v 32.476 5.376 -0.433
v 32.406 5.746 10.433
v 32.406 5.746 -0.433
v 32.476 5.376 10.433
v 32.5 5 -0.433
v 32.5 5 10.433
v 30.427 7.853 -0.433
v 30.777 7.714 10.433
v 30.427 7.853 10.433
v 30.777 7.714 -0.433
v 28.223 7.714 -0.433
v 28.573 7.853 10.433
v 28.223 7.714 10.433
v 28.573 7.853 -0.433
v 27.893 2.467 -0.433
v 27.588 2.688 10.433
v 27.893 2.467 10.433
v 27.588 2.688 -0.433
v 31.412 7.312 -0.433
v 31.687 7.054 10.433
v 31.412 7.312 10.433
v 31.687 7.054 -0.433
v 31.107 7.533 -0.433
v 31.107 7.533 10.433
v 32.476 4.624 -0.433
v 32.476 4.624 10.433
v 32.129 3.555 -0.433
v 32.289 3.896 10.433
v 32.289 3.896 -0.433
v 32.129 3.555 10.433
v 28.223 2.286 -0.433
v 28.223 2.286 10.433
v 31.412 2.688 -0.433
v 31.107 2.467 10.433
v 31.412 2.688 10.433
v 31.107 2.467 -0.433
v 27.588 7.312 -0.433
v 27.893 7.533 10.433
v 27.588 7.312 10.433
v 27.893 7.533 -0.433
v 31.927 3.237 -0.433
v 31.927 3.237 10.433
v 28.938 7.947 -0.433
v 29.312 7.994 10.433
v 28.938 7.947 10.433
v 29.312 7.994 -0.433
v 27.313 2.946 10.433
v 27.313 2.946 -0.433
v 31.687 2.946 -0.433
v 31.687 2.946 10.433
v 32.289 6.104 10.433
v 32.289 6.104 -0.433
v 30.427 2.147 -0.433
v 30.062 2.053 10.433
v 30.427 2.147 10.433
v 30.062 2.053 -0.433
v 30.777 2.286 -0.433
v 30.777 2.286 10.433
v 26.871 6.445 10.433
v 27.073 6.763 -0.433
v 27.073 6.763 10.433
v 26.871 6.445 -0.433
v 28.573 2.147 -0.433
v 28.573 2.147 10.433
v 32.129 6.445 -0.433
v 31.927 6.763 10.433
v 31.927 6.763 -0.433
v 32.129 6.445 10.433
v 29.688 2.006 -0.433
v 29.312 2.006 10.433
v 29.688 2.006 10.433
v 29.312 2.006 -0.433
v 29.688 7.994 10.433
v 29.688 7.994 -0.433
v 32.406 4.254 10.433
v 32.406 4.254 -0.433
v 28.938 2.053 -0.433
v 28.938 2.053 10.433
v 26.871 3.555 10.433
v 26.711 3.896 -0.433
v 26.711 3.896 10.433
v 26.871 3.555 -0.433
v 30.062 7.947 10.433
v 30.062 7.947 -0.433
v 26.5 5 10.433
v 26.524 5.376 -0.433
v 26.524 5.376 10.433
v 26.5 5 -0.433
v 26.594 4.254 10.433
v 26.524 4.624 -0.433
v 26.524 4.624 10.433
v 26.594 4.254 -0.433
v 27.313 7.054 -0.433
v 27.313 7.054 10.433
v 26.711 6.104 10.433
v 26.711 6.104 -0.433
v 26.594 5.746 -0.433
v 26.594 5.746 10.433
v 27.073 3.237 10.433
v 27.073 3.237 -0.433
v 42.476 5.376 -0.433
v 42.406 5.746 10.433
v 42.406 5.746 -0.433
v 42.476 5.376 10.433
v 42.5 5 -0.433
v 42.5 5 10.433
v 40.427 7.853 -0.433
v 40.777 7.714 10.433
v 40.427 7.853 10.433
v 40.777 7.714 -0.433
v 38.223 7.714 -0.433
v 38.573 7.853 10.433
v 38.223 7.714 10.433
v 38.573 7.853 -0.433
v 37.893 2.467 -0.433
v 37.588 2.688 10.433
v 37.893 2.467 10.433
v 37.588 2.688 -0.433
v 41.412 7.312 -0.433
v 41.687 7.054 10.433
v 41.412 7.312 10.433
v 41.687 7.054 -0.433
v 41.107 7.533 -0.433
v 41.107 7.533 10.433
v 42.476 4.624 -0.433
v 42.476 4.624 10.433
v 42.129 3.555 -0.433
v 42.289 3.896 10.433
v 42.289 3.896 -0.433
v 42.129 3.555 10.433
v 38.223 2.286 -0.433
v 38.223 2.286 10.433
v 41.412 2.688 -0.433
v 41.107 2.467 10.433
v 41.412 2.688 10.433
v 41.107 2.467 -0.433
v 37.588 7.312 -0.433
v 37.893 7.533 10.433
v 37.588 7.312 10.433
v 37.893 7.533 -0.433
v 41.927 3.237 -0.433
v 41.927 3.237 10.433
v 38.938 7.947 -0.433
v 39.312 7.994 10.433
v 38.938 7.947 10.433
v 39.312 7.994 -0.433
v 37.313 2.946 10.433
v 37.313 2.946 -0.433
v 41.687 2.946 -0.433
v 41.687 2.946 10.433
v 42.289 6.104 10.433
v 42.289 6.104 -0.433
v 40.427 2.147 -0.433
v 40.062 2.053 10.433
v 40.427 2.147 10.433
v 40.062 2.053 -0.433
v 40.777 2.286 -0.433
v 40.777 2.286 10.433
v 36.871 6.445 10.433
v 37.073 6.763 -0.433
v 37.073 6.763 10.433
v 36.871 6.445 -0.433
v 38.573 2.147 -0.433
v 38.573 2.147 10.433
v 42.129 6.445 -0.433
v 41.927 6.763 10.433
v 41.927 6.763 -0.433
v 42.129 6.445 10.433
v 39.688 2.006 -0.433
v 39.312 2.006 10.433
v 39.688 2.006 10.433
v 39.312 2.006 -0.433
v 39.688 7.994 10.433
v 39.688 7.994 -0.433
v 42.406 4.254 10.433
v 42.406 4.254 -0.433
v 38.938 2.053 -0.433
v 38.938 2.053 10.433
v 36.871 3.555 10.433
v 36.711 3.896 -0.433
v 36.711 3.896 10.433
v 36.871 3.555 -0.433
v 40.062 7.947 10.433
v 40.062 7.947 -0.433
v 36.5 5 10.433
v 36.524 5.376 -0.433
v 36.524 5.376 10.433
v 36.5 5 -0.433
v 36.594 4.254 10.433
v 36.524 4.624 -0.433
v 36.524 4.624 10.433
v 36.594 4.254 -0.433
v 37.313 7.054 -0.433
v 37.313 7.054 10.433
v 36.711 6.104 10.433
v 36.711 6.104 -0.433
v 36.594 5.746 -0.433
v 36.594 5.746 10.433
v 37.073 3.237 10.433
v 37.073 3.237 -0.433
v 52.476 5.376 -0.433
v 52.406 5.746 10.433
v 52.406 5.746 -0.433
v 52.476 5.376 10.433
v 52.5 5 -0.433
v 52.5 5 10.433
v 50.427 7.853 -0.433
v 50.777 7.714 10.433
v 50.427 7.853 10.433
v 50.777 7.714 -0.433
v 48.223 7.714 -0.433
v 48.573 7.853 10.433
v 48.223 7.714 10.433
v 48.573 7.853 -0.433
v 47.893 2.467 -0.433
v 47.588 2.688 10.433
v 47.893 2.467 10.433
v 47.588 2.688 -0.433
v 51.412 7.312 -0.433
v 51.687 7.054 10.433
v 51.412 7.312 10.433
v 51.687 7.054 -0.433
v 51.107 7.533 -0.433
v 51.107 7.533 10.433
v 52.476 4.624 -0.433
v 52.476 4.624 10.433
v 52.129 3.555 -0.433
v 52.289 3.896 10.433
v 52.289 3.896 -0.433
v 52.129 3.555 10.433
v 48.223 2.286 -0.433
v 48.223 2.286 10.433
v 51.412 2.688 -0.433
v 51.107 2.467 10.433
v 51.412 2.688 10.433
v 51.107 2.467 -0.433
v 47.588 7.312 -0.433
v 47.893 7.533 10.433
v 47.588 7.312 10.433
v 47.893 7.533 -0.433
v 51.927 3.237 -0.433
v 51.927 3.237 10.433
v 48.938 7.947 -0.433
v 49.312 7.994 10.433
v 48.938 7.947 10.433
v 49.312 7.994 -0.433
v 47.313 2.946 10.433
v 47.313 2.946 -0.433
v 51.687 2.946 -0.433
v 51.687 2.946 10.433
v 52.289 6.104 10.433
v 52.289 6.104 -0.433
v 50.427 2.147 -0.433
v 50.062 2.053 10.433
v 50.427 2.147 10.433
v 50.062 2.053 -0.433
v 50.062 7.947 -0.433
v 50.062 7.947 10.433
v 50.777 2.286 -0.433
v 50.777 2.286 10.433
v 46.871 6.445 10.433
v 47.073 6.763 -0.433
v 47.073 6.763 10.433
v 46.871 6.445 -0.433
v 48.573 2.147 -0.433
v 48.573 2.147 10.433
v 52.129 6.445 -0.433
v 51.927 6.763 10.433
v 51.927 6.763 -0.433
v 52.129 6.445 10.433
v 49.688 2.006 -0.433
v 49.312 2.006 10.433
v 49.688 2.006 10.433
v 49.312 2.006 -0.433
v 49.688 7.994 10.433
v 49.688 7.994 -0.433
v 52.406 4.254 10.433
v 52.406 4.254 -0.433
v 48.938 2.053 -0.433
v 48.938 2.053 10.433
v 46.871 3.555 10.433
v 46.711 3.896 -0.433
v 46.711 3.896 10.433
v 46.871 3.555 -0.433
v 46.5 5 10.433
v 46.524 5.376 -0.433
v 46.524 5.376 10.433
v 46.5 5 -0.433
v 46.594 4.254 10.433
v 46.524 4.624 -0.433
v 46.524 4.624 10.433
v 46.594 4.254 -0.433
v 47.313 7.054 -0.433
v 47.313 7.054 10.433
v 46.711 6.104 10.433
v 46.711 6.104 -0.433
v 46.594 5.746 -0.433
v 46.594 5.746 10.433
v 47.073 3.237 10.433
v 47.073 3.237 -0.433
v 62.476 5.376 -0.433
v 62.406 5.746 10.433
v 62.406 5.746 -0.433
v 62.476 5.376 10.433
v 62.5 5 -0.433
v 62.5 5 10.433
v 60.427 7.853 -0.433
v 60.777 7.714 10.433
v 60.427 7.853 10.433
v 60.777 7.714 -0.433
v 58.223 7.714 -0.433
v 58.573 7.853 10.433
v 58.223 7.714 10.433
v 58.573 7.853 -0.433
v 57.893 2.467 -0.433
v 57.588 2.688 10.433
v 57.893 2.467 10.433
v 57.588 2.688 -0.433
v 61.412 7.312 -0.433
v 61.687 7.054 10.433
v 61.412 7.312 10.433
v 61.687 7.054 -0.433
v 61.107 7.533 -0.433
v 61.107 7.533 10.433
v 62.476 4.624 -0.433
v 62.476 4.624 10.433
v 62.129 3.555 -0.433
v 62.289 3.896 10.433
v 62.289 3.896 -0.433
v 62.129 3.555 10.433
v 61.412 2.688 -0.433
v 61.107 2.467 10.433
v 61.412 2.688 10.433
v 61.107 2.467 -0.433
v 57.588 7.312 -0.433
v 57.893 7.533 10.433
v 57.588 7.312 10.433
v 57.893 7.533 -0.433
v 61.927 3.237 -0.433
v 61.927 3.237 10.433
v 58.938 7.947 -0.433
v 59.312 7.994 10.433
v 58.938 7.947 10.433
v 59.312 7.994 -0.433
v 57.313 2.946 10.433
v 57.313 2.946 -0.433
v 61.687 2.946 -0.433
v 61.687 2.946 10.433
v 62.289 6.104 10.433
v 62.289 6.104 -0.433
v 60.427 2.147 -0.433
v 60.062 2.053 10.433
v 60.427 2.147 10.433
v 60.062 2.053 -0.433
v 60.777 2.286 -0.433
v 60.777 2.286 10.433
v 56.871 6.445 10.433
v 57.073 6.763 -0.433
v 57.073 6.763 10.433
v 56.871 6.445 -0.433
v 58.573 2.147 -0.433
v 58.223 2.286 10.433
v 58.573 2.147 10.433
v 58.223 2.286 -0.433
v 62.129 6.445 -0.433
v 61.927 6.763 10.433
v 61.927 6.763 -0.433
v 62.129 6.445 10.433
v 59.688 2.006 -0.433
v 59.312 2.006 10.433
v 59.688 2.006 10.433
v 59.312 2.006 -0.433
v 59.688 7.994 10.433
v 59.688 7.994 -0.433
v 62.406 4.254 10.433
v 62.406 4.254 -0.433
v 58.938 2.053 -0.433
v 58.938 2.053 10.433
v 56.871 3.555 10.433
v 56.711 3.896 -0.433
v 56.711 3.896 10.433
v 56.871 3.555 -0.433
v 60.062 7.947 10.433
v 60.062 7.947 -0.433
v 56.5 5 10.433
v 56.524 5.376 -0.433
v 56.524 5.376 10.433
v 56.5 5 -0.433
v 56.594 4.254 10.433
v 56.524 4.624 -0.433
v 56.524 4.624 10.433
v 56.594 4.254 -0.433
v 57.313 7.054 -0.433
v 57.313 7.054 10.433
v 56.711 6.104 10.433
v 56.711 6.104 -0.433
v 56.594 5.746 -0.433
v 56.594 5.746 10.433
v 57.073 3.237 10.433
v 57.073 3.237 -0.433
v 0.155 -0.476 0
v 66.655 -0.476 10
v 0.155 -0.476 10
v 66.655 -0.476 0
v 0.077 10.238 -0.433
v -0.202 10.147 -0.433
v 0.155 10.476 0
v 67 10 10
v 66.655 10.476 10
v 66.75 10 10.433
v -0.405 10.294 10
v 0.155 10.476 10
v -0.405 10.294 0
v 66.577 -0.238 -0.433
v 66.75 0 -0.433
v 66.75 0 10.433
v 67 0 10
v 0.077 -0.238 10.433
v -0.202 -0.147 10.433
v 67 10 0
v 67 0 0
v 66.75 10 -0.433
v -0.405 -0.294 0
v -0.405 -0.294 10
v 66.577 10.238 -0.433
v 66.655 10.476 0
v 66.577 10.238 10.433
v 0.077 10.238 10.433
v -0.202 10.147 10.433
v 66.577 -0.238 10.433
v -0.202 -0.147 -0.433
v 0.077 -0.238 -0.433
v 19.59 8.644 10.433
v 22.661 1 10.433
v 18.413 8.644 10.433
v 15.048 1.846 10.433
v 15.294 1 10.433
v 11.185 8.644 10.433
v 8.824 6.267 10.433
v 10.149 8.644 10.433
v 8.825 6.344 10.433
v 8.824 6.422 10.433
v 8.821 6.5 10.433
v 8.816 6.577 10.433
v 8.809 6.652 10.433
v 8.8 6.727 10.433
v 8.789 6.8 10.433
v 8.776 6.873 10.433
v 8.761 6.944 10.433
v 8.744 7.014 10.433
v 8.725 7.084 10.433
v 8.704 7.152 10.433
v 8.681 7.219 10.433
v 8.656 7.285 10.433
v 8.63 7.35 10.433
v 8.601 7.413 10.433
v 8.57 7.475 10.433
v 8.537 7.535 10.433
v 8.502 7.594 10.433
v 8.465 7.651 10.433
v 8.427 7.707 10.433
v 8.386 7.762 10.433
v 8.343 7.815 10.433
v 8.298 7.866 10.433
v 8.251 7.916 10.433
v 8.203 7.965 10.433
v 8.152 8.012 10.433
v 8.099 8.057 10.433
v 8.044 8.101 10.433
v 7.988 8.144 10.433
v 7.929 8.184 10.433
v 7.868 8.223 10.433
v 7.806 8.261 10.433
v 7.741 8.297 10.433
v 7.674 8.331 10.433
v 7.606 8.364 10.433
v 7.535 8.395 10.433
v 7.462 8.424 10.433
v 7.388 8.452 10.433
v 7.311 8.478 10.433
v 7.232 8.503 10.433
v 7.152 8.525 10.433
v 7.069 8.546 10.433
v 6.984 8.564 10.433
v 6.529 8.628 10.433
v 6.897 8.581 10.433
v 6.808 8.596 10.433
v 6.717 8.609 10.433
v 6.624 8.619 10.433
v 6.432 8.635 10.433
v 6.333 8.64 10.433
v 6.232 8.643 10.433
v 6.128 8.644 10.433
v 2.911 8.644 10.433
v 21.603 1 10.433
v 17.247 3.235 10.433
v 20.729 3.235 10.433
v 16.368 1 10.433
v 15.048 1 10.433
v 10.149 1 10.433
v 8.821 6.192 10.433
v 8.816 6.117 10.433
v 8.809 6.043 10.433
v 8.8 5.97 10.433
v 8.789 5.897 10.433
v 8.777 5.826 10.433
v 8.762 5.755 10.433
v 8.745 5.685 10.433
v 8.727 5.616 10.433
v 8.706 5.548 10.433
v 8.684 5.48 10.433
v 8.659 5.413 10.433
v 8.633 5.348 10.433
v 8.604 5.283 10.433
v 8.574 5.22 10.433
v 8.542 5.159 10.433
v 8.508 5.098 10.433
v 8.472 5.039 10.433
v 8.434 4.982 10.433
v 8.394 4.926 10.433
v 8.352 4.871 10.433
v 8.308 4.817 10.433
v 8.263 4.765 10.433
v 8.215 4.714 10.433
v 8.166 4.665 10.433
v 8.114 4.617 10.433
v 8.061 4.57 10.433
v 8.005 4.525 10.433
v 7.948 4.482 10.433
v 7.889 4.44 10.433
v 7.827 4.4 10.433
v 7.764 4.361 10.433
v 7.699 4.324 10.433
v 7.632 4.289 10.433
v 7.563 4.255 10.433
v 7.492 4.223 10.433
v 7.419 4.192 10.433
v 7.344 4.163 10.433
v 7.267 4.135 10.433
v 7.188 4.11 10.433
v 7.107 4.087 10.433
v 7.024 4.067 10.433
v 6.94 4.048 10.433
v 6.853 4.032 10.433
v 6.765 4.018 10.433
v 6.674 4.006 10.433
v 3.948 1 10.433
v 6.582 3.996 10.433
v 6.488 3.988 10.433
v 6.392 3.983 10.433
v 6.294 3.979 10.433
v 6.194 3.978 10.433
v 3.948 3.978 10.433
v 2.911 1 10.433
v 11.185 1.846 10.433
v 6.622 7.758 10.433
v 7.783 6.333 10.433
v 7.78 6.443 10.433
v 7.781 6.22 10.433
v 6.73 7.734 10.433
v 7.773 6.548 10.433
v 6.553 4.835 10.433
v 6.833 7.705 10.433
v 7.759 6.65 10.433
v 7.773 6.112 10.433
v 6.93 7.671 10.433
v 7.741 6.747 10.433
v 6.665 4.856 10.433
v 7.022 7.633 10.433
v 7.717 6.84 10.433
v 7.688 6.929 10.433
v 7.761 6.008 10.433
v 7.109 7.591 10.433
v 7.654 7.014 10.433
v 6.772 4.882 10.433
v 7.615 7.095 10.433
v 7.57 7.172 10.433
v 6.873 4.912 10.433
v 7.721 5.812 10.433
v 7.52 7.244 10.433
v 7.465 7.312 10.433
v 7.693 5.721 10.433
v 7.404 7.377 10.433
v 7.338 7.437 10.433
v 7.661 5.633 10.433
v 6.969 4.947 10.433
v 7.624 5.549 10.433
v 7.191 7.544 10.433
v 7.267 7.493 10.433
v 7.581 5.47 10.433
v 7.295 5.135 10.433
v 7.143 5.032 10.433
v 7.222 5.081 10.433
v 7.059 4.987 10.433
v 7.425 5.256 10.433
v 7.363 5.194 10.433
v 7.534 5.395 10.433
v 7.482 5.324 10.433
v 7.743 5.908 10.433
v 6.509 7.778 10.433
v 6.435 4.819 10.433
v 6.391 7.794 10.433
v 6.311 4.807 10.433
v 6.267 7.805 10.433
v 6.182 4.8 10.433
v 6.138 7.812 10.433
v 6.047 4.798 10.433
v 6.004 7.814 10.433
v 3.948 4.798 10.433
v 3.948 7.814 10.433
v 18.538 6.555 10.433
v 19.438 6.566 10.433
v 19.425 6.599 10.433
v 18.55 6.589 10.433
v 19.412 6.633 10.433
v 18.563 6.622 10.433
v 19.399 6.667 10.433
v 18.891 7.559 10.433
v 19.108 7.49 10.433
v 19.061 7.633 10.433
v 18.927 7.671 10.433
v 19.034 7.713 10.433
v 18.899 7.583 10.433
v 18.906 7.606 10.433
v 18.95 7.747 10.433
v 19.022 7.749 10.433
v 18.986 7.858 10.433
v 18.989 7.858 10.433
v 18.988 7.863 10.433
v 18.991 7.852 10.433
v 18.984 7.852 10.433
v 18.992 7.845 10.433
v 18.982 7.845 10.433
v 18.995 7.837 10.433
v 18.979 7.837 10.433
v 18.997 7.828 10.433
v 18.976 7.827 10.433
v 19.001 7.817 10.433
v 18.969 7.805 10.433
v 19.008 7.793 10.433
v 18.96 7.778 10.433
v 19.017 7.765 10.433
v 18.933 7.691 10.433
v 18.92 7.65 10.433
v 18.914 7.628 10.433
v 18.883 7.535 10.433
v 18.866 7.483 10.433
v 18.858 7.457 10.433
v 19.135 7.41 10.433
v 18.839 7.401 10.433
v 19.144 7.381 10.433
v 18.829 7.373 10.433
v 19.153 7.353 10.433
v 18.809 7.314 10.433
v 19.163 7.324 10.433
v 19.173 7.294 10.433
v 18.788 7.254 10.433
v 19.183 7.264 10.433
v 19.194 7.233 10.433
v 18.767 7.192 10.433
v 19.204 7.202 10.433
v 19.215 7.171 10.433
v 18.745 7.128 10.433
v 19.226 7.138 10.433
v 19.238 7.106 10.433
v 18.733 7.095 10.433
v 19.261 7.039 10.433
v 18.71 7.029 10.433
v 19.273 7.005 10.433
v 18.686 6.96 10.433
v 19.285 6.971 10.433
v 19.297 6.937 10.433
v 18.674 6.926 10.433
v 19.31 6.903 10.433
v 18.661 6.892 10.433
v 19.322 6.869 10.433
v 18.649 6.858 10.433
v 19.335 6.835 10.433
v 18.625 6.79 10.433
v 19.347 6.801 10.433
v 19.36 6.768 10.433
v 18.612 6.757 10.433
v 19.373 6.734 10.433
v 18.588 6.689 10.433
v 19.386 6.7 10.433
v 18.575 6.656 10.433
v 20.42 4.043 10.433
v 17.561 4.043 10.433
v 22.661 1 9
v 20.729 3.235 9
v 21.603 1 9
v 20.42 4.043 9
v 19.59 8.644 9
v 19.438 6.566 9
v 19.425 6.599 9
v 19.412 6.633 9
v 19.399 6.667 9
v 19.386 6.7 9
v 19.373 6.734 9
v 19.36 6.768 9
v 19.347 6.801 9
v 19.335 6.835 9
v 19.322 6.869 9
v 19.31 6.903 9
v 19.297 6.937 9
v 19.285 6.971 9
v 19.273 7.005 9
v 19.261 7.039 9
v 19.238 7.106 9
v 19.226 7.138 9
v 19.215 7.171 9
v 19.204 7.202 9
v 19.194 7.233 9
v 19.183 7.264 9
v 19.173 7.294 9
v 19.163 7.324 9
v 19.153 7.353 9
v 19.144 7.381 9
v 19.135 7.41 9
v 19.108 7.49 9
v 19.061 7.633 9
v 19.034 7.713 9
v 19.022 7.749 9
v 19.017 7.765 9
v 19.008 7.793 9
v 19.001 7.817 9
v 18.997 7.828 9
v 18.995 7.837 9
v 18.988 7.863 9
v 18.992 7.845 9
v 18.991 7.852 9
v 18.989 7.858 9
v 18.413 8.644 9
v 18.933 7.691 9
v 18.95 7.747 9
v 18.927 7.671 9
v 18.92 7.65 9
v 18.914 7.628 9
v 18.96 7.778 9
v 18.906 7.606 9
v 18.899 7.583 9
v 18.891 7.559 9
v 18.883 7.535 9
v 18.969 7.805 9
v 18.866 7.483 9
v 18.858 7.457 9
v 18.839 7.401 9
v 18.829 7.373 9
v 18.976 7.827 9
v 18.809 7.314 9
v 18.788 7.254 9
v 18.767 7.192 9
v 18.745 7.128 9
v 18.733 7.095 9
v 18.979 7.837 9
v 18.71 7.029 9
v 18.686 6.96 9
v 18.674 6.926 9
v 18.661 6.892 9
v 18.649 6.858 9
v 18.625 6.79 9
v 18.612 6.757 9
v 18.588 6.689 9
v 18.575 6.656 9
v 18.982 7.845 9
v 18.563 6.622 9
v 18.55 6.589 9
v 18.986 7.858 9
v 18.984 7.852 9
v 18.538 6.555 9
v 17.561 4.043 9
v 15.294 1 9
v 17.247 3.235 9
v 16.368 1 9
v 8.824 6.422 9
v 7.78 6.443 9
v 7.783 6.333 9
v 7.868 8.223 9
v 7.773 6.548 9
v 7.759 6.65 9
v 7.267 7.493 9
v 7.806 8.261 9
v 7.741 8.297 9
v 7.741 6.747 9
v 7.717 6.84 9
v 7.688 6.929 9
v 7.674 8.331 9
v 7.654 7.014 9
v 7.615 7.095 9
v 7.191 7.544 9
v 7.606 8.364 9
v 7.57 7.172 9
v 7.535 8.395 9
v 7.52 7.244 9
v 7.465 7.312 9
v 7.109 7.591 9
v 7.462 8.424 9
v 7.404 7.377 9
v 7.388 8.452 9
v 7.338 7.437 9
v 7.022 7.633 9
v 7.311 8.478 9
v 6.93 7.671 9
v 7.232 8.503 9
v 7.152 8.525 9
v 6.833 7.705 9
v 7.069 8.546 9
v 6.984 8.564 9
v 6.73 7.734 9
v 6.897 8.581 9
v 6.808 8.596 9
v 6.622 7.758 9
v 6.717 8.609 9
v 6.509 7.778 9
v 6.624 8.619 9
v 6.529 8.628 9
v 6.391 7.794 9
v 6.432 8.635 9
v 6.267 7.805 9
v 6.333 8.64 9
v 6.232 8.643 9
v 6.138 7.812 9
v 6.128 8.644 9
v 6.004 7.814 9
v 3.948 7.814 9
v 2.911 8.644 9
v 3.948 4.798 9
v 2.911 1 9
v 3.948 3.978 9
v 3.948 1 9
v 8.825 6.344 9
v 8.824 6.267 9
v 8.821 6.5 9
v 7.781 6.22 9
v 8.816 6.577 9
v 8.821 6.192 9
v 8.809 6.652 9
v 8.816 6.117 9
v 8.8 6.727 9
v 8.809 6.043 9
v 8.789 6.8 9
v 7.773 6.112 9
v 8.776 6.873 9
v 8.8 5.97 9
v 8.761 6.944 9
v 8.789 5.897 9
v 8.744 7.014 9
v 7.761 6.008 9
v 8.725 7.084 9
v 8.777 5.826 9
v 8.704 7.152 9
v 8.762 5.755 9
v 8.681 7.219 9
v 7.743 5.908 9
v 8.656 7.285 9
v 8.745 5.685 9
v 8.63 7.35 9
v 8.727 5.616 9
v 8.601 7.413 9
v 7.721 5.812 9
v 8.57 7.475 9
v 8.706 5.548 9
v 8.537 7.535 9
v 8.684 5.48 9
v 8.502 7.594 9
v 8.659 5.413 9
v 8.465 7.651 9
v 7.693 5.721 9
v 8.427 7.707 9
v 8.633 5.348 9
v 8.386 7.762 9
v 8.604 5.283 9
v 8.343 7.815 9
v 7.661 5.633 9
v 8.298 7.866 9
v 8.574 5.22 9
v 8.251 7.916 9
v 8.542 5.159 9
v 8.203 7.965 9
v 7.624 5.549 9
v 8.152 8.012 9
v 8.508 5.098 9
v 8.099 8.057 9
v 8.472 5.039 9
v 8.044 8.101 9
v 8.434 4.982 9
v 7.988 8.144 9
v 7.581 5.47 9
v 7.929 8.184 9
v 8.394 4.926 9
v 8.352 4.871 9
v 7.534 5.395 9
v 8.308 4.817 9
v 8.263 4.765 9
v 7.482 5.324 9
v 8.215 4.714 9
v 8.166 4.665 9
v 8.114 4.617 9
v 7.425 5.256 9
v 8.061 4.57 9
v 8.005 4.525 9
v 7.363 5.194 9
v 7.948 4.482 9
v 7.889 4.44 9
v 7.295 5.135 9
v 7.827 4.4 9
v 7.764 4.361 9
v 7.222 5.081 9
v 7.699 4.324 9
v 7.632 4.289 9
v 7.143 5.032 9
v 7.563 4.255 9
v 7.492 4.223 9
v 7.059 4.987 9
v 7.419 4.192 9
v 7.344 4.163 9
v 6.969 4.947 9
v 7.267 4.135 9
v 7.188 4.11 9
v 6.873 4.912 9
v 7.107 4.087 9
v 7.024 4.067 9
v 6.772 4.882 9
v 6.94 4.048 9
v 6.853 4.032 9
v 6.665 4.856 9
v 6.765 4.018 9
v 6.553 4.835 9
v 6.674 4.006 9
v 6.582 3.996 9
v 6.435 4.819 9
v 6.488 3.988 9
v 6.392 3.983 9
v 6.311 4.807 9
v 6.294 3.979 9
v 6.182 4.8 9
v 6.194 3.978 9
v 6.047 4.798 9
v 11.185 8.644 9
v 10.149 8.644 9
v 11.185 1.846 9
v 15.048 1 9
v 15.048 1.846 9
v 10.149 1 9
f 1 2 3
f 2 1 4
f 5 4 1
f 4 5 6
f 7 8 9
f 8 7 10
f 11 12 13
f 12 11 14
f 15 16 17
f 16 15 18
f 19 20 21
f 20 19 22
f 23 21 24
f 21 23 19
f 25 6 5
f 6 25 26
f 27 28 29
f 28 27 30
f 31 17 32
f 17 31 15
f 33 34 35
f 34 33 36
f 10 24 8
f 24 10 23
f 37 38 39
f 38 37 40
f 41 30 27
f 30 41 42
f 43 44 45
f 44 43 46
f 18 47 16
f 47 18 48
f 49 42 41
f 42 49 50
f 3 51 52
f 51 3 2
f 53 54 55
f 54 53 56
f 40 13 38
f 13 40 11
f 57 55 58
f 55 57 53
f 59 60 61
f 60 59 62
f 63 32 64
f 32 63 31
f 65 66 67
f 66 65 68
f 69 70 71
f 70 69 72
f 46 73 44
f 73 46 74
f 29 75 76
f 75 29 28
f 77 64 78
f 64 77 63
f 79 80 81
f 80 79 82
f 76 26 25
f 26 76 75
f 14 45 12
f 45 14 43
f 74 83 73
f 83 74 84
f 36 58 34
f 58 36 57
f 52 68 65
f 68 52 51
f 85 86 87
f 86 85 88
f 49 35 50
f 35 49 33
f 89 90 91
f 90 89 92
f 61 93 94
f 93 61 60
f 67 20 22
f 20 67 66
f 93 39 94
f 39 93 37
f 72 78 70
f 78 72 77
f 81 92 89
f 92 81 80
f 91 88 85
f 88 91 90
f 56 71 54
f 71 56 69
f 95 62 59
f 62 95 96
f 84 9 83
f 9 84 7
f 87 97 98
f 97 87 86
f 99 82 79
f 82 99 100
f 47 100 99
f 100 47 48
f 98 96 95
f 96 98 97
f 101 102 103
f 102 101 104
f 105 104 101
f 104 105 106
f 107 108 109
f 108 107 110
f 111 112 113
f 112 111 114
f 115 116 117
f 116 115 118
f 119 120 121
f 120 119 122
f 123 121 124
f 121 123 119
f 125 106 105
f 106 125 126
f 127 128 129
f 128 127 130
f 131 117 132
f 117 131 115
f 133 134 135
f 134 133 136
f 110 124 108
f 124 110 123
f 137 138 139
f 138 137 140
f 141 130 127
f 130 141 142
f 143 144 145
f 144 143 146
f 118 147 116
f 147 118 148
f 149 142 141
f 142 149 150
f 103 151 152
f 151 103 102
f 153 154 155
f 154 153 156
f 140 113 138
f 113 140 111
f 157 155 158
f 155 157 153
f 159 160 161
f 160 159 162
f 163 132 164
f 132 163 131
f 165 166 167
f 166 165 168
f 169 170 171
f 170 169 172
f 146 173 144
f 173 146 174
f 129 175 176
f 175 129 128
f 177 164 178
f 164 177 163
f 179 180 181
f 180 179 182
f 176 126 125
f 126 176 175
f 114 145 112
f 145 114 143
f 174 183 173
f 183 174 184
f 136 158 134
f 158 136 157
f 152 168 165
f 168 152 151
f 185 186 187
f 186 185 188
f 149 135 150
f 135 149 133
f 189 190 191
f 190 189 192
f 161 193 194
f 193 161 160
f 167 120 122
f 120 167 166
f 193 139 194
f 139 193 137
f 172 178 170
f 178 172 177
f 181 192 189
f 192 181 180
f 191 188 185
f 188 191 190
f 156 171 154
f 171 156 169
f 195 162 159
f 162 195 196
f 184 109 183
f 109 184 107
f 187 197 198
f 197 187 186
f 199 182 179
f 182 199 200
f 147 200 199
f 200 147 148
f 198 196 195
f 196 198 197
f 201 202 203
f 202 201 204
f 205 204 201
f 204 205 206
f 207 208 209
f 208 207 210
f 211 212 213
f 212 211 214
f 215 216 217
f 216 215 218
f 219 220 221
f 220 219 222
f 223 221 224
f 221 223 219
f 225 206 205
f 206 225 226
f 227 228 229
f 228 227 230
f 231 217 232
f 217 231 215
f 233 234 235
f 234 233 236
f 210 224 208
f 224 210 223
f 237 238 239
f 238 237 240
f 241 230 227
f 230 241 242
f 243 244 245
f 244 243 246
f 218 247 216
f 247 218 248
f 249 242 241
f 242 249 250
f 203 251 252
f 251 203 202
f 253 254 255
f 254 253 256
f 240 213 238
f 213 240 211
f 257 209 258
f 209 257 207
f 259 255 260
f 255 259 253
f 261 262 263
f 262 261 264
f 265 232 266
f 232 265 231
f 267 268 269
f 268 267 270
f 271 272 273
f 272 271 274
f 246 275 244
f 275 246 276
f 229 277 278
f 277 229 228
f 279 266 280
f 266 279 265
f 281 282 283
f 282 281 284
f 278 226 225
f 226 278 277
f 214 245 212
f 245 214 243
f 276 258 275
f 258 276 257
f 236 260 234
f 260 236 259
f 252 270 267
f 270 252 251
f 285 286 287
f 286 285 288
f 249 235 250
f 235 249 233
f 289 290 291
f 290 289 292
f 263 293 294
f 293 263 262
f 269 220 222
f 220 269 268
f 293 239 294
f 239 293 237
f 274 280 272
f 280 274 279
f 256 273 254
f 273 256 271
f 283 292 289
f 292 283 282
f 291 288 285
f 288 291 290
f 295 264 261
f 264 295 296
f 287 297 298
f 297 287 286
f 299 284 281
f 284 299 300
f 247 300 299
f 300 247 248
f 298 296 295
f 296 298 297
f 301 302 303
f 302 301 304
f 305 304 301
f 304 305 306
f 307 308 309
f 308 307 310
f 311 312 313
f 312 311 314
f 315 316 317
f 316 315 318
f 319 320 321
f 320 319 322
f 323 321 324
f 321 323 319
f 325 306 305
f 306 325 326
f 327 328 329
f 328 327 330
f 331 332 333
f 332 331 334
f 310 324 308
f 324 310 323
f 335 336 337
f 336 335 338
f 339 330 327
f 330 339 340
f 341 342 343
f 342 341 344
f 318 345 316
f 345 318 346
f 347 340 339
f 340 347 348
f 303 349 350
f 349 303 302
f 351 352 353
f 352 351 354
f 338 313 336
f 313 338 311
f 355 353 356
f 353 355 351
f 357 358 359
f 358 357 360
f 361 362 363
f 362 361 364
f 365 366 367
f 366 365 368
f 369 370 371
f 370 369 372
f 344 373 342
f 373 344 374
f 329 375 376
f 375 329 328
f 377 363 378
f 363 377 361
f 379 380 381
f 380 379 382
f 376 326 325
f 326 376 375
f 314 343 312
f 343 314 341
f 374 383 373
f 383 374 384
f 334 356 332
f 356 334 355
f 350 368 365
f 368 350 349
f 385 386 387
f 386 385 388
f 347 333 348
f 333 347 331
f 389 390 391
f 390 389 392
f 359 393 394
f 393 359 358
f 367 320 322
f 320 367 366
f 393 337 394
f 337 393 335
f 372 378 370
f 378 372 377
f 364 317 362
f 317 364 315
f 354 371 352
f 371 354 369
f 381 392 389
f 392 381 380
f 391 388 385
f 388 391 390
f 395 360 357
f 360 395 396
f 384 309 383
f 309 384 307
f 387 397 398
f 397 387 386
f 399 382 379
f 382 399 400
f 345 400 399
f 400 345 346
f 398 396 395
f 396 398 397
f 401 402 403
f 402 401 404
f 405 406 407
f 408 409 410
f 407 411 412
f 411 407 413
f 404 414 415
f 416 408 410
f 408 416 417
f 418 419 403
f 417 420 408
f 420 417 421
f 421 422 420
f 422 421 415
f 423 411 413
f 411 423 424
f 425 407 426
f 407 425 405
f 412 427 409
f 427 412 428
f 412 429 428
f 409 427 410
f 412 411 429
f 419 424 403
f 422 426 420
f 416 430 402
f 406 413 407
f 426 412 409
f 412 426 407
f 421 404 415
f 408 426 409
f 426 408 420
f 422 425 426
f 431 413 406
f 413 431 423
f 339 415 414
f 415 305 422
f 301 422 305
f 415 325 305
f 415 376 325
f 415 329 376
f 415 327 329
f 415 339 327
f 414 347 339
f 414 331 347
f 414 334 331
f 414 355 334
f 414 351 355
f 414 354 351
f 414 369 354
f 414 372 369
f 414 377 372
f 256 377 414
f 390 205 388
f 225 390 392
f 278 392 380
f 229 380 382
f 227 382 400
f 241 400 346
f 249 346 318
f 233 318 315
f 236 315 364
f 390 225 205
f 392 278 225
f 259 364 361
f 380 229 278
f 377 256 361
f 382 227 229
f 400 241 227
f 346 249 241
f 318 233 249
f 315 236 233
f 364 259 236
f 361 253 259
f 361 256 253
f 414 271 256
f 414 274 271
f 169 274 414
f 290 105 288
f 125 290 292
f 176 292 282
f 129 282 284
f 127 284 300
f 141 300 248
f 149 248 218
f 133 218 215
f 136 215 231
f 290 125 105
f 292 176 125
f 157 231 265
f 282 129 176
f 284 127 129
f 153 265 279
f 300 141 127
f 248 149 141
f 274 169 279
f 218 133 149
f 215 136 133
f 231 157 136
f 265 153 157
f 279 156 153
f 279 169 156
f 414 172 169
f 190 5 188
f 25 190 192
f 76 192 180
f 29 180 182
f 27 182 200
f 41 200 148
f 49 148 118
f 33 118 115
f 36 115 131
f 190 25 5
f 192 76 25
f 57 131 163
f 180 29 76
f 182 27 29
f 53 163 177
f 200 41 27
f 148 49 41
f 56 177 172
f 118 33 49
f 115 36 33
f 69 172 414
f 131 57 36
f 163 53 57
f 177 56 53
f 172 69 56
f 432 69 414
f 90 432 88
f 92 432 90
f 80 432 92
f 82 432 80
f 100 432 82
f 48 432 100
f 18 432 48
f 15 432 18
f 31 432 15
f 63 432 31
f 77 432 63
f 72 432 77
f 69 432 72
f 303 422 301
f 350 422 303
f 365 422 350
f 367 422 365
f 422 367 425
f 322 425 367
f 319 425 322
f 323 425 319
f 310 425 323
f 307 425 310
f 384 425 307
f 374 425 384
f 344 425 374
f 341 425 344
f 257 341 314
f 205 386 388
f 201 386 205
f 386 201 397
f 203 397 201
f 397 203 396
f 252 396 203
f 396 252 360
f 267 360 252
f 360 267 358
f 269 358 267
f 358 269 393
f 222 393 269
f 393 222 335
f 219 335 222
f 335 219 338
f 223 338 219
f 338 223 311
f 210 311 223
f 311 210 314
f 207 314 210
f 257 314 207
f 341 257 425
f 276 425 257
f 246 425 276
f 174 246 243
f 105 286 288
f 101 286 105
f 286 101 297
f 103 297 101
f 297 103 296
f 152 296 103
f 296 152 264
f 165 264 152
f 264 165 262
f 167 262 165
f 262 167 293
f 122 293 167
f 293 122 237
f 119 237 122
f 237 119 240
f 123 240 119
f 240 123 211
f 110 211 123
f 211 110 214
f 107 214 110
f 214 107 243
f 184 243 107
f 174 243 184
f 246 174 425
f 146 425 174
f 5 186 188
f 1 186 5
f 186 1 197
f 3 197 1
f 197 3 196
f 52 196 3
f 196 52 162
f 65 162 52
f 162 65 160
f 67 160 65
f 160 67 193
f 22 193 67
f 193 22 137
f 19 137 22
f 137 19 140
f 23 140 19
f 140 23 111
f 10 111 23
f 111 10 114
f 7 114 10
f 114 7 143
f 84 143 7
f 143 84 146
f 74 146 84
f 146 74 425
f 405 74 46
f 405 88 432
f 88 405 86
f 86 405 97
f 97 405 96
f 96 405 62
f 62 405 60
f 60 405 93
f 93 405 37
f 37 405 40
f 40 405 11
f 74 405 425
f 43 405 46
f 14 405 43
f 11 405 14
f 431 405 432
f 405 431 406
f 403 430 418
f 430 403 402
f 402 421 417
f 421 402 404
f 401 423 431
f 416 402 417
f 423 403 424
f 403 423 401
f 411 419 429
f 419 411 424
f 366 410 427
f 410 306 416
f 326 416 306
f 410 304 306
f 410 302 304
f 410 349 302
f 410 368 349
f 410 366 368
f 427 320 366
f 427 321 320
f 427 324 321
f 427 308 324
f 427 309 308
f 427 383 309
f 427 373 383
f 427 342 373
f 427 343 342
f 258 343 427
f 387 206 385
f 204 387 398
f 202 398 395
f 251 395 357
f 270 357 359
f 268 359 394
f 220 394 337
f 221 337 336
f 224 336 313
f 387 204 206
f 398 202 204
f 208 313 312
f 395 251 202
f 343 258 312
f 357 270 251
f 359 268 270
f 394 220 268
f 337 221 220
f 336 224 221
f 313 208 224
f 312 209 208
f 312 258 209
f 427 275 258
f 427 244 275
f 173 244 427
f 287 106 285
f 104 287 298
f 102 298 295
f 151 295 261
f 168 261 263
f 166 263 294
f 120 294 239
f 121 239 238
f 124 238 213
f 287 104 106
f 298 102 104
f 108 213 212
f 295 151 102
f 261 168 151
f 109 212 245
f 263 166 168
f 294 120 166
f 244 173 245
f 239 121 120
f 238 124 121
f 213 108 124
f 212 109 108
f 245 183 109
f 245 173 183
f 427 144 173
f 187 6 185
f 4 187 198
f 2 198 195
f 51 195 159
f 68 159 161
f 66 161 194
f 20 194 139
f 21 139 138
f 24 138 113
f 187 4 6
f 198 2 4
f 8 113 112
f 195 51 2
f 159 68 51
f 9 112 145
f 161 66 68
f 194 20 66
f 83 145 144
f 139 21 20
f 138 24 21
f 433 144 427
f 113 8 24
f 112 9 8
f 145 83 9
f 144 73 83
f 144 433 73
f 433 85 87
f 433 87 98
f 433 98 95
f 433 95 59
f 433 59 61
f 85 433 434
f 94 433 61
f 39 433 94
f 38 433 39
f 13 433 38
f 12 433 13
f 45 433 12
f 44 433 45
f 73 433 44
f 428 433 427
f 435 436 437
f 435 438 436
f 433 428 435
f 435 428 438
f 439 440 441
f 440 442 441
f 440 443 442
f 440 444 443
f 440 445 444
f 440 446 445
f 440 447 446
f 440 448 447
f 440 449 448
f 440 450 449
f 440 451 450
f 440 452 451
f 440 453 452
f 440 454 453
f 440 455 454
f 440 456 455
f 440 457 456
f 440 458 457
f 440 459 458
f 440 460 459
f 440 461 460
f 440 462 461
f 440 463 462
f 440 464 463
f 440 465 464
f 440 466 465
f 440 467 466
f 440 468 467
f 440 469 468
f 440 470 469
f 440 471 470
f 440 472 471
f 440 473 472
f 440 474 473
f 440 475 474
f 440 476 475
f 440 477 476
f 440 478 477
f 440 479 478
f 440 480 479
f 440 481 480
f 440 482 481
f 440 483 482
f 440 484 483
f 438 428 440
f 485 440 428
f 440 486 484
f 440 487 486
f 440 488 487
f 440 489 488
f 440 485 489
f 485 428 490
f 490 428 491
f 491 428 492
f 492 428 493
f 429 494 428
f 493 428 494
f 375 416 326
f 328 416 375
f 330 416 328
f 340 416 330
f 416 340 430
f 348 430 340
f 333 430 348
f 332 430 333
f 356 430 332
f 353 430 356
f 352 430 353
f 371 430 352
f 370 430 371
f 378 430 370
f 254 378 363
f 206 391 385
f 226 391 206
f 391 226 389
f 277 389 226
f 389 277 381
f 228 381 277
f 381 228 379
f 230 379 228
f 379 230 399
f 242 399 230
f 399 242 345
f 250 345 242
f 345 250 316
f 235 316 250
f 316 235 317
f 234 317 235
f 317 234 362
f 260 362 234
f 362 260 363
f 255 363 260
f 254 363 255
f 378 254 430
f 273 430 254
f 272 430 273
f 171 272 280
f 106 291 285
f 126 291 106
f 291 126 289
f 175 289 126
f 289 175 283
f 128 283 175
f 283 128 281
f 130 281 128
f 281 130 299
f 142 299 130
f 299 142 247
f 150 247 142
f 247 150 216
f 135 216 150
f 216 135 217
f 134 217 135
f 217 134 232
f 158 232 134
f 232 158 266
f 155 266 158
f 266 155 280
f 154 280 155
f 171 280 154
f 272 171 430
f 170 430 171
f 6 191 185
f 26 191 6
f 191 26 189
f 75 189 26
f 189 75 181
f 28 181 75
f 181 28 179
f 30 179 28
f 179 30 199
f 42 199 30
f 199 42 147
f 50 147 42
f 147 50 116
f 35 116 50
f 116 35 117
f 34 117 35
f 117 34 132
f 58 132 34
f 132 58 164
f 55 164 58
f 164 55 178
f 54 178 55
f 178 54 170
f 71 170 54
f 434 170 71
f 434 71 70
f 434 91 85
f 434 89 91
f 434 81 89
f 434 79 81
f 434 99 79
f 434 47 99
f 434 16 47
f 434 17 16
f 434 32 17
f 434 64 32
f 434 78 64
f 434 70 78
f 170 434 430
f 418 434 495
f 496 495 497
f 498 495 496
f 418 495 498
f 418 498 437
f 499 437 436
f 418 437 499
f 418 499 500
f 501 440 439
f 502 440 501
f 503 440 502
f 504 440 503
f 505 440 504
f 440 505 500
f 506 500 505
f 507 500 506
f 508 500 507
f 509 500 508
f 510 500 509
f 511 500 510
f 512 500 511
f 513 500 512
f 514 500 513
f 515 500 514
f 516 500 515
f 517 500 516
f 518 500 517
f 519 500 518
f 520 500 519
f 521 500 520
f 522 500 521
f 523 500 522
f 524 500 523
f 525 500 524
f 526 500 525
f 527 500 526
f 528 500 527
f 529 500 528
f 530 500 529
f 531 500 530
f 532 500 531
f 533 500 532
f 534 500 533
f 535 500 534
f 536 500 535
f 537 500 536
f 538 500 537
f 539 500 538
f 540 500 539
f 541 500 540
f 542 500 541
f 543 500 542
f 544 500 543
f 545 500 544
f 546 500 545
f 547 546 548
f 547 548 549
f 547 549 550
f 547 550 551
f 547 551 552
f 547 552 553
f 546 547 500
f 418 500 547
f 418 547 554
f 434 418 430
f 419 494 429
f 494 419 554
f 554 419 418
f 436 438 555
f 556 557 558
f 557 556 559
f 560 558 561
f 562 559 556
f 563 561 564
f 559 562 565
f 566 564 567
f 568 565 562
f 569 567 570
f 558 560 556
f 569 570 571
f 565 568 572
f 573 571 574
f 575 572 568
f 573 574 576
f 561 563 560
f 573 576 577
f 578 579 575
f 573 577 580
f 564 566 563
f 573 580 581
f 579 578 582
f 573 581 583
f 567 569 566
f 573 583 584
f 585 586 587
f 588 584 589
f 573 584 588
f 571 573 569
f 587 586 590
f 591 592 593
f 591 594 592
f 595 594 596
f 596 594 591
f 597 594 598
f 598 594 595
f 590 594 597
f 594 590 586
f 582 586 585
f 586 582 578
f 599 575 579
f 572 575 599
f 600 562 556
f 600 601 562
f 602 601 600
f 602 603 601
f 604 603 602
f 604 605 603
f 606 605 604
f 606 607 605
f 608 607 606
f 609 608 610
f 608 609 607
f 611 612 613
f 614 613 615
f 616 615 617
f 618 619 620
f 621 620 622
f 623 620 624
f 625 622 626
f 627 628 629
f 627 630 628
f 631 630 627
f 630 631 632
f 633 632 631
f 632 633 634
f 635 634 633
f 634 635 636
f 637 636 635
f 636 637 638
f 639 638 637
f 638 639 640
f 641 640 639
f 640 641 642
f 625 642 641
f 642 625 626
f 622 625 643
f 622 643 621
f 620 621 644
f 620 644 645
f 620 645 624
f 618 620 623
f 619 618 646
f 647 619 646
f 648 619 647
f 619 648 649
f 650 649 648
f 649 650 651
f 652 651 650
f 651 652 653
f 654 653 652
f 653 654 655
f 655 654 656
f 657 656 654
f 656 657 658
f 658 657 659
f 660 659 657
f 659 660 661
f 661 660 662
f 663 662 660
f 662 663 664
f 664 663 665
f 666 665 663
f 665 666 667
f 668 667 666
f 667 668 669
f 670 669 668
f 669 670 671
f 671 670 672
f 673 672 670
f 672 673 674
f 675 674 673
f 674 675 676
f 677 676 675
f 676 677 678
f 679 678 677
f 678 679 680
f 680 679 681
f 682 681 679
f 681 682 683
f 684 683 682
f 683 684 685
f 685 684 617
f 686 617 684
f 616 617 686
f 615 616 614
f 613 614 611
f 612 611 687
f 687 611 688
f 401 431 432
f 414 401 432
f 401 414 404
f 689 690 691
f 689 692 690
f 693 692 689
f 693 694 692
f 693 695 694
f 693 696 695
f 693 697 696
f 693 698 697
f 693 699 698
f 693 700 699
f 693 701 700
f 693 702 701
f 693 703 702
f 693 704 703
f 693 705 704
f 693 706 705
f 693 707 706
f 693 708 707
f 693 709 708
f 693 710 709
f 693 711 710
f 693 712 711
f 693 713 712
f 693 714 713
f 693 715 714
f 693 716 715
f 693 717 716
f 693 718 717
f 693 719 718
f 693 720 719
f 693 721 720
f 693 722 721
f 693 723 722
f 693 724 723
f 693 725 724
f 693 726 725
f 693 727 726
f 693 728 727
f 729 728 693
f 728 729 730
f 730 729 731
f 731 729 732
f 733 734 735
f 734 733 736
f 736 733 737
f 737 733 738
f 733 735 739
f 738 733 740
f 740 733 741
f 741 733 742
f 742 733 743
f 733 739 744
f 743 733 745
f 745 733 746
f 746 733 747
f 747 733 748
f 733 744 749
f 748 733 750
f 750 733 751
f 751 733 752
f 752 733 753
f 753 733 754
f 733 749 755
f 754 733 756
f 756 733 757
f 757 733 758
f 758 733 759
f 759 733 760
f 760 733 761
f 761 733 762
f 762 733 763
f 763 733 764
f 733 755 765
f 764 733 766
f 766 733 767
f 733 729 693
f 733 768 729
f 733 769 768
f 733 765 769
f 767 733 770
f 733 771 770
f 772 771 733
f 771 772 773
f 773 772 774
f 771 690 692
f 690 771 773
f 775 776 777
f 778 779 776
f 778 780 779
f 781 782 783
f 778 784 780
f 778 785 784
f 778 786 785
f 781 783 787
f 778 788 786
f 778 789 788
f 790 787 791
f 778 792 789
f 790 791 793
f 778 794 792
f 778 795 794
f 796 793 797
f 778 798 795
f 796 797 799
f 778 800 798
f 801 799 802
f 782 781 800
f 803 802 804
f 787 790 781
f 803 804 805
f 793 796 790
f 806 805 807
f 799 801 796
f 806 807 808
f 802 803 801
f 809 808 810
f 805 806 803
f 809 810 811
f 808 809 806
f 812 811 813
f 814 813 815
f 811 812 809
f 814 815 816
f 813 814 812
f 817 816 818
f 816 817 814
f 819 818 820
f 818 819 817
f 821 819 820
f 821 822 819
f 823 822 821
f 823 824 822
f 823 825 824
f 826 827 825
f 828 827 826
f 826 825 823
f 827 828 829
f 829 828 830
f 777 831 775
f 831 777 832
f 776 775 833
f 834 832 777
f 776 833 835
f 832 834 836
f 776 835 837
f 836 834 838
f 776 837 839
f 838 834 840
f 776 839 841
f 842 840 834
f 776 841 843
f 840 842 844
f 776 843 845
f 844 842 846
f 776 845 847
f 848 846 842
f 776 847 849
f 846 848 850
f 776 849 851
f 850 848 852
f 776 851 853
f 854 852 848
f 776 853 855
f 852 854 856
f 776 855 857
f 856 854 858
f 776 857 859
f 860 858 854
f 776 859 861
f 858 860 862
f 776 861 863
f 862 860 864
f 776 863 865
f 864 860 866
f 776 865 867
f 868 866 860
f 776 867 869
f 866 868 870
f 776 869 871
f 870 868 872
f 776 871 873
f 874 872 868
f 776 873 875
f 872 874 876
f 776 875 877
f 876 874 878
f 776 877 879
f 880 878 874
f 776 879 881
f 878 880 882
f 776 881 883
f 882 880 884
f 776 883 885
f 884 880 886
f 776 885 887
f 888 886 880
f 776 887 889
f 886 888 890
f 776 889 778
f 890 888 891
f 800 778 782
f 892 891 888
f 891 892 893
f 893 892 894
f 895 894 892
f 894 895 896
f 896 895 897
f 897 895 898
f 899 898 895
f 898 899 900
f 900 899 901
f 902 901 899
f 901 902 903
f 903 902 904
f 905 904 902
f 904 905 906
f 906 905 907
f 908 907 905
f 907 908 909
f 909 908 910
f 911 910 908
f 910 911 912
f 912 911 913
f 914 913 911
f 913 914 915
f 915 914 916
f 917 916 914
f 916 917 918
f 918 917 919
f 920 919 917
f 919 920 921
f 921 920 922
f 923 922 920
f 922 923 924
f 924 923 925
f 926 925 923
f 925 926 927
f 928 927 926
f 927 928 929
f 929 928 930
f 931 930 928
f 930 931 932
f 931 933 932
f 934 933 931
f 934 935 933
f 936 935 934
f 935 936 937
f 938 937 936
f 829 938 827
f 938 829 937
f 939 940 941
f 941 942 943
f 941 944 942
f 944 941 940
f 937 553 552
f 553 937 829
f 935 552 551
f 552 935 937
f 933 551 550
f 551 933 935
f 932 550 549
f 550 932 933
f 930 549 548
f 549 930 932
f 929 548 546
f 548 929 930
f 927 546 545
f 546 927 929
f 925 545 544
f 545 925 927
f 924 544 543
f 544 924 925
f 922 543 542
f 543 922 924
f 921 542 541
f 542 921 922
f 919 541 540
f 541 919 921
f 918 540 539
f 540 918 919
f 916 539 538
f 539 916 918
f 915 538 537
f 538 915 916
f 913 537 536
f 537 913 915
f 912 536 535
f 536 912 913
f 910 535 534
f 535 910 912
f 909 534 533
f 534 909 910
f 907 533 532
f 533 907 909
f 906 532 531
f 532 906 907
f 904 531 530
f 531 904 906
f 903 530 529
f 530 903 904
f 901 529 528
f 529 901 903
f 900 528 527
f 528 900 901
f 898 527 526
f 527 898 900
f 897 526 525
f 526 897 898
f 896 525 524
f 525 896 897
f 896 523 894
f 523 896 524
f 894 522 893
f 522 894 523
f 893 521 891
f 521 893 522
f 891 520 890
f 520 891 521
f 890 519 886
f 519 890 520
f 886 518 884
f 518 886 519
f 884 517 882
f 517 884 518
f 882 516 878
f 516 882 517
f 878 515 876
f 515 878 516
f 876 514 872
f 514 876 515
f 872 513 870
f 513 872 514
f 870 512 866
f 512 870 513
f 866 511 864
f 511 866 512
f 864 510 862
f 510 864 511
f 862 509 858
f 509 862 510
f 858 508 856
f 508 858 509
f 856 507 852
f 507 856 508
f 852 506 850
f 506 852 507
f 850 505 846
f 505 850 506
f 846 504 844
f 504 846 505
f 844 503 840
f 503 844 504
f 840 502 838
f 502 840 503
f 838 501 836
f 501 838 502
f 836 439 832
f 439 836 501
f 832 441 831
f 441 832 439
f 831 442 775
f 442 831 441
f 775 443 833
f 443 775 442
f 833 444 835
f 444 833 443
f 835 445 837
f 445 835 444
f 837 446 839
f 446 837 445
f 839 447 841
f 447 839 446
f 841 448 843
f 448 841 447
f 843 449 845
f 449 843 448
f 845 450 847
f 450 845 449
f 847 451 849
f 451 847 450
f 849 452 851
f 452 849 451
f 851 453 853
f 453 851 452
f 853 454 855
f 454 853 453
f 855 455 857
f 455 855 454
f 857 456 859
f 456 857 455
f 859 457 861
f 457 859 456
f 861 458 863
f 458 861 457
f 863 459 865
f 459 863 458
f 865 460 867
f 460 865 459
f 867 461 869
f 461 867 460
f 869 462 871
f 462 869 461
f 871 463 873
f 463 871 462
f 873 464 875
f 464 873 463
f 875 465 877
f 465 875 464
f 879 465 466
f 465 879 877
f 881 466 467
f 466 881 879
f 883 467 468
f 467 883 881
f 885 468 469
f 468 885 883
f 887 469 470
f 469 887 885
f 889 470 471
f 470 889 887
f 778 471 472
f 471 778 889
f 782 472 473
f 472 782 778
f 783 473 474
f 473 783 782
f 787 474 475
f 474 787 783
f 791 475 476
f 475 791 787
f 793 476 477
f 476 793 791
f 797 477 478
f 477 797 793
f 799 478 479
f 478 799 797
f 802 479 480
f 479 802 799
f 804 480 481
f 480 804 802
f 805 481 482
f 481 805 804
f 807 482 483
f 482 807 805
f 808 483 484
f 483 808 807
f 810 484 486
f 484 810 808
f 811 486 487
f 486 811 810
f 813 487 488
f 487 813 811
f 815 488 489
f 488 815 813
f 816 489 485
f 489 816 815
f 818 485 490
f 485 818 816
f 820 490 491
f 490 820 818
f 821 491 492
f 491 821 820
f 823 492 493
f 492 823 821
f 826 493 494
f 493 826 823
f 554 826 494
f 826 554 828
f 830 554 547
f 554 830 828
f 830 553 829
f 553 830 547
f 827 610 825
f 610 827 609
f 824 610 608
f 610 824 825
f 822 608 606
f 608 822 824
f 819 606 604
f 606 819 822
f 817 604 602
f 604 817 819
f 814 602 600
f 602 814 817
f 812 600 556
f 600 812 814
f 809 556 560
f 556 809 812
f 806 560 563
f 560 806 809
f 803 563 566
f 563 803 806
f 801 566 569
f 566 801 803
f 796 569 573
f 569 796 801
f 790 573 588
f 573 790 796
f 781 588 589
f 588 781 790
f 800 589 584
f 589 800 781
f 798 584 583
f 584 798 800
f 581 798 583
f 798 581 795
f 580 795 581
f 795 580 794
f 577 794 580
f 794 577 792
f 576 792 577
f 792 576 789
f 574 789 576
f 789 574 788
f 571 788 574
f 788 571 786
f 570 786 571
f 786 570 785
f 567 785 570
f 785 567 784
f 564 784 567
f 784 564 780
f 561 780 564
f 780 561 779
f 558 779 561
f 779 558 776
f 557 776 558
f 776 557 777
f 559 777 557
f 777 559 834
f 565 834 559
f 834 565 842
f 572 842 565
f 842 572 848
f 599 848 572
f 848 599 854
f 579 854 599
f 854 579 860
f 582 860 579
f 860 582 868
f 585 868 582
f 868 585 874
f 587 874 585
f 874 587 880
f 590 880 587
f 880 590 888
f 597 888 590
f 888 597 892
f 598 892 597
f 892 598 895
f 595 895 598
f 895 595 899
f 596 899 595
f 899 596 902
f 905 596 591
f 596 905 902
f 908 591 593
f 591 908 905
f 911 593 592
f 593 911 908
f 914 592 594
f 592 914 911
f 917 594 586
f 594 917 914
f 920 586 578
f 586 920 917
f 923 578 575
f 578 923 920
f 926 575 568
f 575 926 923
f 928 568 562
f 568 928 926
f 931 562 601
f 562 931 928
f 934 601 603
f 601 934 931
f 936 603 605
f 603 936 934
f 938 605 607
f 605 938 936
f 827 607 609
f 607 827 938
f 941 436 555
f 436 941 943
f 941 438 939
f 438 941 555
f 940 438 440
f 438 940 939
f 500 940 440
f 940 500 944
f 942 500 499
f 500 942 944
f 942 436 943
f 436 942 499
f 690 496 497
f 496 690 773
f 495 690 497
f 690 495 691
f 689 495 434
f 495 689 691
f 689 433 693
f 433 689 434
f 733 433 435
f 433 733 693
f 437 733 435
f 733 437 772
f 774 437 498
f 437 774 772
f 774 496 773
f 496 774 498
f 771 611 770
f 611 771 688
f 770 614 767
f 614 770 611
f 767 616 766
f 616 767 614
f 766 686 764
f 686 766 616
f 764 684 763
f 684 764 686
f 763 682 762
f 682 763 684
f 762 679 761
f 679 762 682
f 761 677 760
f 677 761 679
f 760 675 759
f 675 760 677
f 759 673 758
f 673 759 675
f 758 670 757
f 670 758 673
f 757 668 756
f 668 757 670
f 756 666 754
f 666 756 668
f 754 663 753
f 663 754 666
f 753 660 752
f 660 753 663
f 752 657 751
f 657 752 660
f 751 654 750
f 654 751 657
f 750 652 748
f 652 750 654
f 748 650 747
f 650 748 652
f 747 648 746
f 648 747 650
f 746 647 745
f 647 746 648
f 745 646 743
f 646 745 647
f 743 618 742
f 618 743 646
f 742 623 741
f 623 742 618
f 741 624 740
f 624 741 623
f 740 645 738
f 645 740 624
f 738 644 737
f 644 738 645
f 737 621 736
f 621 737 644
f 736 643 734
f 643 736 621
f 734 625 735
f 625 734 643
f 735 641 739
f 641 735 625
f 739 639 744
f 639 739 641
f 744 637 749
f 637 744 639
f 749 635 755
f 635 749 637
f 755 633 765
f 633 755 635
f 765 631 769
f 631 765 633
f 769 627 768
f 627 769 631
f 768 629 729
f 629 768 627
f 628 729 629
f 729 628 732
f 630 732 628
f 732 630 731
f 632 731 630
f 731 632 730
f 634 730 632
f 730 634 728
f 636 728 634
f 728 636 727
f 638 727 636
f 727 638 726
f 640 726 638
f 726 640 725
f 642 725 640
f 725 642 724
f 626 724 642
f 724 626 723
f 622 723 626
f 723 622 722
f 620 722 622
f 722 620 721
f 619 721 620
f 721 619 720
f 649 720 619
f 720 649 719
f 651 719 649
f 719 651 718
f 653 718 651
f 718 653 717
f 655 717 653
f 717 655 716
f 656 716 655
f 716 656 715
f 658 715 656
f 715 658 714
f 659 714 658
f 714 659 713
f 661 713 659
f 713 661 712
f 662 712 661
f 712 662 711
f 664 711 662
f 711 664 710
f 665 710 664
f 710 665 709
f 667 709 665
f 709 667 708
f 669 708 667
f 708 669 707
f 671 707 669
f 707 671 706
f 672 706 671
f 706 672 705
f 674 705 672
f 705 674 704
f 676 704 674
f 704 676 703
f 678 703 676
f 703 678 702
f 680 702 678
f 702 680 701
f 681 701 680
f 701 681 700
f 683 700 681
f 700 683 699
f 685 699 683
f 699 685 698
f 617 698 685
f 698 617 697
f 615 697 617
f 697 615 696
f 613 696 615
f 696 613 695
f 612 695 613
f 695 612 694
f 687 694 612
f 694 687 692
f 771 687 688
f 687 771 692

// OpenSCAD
/*universal nozzleplate for M6 nozzles (Mk8, Ultimaker 2, Creality CR-10, Ender 2)
text, number of nozzles 
20181013 P. de Graaff
*/

//Material
Text="PLA";

//number of nozzle holes
number=4;

difference(){
    minkowski(){
        cube([len(Text)*8+number*10+2.5,10,10]);
        sphere(0.5);
    }
    for (i=[0:number-1]){
        translate([len(Text)*8+5+i*10+0.5,5,-1])cylinder(d=6,h=20,$fn=50);
    }
    //Text
     #translate([2,1,9])linear_extrude(height = 2,convexity=4)
      text(Text, size = 8, font ="Arial", $fn = 100);
}
